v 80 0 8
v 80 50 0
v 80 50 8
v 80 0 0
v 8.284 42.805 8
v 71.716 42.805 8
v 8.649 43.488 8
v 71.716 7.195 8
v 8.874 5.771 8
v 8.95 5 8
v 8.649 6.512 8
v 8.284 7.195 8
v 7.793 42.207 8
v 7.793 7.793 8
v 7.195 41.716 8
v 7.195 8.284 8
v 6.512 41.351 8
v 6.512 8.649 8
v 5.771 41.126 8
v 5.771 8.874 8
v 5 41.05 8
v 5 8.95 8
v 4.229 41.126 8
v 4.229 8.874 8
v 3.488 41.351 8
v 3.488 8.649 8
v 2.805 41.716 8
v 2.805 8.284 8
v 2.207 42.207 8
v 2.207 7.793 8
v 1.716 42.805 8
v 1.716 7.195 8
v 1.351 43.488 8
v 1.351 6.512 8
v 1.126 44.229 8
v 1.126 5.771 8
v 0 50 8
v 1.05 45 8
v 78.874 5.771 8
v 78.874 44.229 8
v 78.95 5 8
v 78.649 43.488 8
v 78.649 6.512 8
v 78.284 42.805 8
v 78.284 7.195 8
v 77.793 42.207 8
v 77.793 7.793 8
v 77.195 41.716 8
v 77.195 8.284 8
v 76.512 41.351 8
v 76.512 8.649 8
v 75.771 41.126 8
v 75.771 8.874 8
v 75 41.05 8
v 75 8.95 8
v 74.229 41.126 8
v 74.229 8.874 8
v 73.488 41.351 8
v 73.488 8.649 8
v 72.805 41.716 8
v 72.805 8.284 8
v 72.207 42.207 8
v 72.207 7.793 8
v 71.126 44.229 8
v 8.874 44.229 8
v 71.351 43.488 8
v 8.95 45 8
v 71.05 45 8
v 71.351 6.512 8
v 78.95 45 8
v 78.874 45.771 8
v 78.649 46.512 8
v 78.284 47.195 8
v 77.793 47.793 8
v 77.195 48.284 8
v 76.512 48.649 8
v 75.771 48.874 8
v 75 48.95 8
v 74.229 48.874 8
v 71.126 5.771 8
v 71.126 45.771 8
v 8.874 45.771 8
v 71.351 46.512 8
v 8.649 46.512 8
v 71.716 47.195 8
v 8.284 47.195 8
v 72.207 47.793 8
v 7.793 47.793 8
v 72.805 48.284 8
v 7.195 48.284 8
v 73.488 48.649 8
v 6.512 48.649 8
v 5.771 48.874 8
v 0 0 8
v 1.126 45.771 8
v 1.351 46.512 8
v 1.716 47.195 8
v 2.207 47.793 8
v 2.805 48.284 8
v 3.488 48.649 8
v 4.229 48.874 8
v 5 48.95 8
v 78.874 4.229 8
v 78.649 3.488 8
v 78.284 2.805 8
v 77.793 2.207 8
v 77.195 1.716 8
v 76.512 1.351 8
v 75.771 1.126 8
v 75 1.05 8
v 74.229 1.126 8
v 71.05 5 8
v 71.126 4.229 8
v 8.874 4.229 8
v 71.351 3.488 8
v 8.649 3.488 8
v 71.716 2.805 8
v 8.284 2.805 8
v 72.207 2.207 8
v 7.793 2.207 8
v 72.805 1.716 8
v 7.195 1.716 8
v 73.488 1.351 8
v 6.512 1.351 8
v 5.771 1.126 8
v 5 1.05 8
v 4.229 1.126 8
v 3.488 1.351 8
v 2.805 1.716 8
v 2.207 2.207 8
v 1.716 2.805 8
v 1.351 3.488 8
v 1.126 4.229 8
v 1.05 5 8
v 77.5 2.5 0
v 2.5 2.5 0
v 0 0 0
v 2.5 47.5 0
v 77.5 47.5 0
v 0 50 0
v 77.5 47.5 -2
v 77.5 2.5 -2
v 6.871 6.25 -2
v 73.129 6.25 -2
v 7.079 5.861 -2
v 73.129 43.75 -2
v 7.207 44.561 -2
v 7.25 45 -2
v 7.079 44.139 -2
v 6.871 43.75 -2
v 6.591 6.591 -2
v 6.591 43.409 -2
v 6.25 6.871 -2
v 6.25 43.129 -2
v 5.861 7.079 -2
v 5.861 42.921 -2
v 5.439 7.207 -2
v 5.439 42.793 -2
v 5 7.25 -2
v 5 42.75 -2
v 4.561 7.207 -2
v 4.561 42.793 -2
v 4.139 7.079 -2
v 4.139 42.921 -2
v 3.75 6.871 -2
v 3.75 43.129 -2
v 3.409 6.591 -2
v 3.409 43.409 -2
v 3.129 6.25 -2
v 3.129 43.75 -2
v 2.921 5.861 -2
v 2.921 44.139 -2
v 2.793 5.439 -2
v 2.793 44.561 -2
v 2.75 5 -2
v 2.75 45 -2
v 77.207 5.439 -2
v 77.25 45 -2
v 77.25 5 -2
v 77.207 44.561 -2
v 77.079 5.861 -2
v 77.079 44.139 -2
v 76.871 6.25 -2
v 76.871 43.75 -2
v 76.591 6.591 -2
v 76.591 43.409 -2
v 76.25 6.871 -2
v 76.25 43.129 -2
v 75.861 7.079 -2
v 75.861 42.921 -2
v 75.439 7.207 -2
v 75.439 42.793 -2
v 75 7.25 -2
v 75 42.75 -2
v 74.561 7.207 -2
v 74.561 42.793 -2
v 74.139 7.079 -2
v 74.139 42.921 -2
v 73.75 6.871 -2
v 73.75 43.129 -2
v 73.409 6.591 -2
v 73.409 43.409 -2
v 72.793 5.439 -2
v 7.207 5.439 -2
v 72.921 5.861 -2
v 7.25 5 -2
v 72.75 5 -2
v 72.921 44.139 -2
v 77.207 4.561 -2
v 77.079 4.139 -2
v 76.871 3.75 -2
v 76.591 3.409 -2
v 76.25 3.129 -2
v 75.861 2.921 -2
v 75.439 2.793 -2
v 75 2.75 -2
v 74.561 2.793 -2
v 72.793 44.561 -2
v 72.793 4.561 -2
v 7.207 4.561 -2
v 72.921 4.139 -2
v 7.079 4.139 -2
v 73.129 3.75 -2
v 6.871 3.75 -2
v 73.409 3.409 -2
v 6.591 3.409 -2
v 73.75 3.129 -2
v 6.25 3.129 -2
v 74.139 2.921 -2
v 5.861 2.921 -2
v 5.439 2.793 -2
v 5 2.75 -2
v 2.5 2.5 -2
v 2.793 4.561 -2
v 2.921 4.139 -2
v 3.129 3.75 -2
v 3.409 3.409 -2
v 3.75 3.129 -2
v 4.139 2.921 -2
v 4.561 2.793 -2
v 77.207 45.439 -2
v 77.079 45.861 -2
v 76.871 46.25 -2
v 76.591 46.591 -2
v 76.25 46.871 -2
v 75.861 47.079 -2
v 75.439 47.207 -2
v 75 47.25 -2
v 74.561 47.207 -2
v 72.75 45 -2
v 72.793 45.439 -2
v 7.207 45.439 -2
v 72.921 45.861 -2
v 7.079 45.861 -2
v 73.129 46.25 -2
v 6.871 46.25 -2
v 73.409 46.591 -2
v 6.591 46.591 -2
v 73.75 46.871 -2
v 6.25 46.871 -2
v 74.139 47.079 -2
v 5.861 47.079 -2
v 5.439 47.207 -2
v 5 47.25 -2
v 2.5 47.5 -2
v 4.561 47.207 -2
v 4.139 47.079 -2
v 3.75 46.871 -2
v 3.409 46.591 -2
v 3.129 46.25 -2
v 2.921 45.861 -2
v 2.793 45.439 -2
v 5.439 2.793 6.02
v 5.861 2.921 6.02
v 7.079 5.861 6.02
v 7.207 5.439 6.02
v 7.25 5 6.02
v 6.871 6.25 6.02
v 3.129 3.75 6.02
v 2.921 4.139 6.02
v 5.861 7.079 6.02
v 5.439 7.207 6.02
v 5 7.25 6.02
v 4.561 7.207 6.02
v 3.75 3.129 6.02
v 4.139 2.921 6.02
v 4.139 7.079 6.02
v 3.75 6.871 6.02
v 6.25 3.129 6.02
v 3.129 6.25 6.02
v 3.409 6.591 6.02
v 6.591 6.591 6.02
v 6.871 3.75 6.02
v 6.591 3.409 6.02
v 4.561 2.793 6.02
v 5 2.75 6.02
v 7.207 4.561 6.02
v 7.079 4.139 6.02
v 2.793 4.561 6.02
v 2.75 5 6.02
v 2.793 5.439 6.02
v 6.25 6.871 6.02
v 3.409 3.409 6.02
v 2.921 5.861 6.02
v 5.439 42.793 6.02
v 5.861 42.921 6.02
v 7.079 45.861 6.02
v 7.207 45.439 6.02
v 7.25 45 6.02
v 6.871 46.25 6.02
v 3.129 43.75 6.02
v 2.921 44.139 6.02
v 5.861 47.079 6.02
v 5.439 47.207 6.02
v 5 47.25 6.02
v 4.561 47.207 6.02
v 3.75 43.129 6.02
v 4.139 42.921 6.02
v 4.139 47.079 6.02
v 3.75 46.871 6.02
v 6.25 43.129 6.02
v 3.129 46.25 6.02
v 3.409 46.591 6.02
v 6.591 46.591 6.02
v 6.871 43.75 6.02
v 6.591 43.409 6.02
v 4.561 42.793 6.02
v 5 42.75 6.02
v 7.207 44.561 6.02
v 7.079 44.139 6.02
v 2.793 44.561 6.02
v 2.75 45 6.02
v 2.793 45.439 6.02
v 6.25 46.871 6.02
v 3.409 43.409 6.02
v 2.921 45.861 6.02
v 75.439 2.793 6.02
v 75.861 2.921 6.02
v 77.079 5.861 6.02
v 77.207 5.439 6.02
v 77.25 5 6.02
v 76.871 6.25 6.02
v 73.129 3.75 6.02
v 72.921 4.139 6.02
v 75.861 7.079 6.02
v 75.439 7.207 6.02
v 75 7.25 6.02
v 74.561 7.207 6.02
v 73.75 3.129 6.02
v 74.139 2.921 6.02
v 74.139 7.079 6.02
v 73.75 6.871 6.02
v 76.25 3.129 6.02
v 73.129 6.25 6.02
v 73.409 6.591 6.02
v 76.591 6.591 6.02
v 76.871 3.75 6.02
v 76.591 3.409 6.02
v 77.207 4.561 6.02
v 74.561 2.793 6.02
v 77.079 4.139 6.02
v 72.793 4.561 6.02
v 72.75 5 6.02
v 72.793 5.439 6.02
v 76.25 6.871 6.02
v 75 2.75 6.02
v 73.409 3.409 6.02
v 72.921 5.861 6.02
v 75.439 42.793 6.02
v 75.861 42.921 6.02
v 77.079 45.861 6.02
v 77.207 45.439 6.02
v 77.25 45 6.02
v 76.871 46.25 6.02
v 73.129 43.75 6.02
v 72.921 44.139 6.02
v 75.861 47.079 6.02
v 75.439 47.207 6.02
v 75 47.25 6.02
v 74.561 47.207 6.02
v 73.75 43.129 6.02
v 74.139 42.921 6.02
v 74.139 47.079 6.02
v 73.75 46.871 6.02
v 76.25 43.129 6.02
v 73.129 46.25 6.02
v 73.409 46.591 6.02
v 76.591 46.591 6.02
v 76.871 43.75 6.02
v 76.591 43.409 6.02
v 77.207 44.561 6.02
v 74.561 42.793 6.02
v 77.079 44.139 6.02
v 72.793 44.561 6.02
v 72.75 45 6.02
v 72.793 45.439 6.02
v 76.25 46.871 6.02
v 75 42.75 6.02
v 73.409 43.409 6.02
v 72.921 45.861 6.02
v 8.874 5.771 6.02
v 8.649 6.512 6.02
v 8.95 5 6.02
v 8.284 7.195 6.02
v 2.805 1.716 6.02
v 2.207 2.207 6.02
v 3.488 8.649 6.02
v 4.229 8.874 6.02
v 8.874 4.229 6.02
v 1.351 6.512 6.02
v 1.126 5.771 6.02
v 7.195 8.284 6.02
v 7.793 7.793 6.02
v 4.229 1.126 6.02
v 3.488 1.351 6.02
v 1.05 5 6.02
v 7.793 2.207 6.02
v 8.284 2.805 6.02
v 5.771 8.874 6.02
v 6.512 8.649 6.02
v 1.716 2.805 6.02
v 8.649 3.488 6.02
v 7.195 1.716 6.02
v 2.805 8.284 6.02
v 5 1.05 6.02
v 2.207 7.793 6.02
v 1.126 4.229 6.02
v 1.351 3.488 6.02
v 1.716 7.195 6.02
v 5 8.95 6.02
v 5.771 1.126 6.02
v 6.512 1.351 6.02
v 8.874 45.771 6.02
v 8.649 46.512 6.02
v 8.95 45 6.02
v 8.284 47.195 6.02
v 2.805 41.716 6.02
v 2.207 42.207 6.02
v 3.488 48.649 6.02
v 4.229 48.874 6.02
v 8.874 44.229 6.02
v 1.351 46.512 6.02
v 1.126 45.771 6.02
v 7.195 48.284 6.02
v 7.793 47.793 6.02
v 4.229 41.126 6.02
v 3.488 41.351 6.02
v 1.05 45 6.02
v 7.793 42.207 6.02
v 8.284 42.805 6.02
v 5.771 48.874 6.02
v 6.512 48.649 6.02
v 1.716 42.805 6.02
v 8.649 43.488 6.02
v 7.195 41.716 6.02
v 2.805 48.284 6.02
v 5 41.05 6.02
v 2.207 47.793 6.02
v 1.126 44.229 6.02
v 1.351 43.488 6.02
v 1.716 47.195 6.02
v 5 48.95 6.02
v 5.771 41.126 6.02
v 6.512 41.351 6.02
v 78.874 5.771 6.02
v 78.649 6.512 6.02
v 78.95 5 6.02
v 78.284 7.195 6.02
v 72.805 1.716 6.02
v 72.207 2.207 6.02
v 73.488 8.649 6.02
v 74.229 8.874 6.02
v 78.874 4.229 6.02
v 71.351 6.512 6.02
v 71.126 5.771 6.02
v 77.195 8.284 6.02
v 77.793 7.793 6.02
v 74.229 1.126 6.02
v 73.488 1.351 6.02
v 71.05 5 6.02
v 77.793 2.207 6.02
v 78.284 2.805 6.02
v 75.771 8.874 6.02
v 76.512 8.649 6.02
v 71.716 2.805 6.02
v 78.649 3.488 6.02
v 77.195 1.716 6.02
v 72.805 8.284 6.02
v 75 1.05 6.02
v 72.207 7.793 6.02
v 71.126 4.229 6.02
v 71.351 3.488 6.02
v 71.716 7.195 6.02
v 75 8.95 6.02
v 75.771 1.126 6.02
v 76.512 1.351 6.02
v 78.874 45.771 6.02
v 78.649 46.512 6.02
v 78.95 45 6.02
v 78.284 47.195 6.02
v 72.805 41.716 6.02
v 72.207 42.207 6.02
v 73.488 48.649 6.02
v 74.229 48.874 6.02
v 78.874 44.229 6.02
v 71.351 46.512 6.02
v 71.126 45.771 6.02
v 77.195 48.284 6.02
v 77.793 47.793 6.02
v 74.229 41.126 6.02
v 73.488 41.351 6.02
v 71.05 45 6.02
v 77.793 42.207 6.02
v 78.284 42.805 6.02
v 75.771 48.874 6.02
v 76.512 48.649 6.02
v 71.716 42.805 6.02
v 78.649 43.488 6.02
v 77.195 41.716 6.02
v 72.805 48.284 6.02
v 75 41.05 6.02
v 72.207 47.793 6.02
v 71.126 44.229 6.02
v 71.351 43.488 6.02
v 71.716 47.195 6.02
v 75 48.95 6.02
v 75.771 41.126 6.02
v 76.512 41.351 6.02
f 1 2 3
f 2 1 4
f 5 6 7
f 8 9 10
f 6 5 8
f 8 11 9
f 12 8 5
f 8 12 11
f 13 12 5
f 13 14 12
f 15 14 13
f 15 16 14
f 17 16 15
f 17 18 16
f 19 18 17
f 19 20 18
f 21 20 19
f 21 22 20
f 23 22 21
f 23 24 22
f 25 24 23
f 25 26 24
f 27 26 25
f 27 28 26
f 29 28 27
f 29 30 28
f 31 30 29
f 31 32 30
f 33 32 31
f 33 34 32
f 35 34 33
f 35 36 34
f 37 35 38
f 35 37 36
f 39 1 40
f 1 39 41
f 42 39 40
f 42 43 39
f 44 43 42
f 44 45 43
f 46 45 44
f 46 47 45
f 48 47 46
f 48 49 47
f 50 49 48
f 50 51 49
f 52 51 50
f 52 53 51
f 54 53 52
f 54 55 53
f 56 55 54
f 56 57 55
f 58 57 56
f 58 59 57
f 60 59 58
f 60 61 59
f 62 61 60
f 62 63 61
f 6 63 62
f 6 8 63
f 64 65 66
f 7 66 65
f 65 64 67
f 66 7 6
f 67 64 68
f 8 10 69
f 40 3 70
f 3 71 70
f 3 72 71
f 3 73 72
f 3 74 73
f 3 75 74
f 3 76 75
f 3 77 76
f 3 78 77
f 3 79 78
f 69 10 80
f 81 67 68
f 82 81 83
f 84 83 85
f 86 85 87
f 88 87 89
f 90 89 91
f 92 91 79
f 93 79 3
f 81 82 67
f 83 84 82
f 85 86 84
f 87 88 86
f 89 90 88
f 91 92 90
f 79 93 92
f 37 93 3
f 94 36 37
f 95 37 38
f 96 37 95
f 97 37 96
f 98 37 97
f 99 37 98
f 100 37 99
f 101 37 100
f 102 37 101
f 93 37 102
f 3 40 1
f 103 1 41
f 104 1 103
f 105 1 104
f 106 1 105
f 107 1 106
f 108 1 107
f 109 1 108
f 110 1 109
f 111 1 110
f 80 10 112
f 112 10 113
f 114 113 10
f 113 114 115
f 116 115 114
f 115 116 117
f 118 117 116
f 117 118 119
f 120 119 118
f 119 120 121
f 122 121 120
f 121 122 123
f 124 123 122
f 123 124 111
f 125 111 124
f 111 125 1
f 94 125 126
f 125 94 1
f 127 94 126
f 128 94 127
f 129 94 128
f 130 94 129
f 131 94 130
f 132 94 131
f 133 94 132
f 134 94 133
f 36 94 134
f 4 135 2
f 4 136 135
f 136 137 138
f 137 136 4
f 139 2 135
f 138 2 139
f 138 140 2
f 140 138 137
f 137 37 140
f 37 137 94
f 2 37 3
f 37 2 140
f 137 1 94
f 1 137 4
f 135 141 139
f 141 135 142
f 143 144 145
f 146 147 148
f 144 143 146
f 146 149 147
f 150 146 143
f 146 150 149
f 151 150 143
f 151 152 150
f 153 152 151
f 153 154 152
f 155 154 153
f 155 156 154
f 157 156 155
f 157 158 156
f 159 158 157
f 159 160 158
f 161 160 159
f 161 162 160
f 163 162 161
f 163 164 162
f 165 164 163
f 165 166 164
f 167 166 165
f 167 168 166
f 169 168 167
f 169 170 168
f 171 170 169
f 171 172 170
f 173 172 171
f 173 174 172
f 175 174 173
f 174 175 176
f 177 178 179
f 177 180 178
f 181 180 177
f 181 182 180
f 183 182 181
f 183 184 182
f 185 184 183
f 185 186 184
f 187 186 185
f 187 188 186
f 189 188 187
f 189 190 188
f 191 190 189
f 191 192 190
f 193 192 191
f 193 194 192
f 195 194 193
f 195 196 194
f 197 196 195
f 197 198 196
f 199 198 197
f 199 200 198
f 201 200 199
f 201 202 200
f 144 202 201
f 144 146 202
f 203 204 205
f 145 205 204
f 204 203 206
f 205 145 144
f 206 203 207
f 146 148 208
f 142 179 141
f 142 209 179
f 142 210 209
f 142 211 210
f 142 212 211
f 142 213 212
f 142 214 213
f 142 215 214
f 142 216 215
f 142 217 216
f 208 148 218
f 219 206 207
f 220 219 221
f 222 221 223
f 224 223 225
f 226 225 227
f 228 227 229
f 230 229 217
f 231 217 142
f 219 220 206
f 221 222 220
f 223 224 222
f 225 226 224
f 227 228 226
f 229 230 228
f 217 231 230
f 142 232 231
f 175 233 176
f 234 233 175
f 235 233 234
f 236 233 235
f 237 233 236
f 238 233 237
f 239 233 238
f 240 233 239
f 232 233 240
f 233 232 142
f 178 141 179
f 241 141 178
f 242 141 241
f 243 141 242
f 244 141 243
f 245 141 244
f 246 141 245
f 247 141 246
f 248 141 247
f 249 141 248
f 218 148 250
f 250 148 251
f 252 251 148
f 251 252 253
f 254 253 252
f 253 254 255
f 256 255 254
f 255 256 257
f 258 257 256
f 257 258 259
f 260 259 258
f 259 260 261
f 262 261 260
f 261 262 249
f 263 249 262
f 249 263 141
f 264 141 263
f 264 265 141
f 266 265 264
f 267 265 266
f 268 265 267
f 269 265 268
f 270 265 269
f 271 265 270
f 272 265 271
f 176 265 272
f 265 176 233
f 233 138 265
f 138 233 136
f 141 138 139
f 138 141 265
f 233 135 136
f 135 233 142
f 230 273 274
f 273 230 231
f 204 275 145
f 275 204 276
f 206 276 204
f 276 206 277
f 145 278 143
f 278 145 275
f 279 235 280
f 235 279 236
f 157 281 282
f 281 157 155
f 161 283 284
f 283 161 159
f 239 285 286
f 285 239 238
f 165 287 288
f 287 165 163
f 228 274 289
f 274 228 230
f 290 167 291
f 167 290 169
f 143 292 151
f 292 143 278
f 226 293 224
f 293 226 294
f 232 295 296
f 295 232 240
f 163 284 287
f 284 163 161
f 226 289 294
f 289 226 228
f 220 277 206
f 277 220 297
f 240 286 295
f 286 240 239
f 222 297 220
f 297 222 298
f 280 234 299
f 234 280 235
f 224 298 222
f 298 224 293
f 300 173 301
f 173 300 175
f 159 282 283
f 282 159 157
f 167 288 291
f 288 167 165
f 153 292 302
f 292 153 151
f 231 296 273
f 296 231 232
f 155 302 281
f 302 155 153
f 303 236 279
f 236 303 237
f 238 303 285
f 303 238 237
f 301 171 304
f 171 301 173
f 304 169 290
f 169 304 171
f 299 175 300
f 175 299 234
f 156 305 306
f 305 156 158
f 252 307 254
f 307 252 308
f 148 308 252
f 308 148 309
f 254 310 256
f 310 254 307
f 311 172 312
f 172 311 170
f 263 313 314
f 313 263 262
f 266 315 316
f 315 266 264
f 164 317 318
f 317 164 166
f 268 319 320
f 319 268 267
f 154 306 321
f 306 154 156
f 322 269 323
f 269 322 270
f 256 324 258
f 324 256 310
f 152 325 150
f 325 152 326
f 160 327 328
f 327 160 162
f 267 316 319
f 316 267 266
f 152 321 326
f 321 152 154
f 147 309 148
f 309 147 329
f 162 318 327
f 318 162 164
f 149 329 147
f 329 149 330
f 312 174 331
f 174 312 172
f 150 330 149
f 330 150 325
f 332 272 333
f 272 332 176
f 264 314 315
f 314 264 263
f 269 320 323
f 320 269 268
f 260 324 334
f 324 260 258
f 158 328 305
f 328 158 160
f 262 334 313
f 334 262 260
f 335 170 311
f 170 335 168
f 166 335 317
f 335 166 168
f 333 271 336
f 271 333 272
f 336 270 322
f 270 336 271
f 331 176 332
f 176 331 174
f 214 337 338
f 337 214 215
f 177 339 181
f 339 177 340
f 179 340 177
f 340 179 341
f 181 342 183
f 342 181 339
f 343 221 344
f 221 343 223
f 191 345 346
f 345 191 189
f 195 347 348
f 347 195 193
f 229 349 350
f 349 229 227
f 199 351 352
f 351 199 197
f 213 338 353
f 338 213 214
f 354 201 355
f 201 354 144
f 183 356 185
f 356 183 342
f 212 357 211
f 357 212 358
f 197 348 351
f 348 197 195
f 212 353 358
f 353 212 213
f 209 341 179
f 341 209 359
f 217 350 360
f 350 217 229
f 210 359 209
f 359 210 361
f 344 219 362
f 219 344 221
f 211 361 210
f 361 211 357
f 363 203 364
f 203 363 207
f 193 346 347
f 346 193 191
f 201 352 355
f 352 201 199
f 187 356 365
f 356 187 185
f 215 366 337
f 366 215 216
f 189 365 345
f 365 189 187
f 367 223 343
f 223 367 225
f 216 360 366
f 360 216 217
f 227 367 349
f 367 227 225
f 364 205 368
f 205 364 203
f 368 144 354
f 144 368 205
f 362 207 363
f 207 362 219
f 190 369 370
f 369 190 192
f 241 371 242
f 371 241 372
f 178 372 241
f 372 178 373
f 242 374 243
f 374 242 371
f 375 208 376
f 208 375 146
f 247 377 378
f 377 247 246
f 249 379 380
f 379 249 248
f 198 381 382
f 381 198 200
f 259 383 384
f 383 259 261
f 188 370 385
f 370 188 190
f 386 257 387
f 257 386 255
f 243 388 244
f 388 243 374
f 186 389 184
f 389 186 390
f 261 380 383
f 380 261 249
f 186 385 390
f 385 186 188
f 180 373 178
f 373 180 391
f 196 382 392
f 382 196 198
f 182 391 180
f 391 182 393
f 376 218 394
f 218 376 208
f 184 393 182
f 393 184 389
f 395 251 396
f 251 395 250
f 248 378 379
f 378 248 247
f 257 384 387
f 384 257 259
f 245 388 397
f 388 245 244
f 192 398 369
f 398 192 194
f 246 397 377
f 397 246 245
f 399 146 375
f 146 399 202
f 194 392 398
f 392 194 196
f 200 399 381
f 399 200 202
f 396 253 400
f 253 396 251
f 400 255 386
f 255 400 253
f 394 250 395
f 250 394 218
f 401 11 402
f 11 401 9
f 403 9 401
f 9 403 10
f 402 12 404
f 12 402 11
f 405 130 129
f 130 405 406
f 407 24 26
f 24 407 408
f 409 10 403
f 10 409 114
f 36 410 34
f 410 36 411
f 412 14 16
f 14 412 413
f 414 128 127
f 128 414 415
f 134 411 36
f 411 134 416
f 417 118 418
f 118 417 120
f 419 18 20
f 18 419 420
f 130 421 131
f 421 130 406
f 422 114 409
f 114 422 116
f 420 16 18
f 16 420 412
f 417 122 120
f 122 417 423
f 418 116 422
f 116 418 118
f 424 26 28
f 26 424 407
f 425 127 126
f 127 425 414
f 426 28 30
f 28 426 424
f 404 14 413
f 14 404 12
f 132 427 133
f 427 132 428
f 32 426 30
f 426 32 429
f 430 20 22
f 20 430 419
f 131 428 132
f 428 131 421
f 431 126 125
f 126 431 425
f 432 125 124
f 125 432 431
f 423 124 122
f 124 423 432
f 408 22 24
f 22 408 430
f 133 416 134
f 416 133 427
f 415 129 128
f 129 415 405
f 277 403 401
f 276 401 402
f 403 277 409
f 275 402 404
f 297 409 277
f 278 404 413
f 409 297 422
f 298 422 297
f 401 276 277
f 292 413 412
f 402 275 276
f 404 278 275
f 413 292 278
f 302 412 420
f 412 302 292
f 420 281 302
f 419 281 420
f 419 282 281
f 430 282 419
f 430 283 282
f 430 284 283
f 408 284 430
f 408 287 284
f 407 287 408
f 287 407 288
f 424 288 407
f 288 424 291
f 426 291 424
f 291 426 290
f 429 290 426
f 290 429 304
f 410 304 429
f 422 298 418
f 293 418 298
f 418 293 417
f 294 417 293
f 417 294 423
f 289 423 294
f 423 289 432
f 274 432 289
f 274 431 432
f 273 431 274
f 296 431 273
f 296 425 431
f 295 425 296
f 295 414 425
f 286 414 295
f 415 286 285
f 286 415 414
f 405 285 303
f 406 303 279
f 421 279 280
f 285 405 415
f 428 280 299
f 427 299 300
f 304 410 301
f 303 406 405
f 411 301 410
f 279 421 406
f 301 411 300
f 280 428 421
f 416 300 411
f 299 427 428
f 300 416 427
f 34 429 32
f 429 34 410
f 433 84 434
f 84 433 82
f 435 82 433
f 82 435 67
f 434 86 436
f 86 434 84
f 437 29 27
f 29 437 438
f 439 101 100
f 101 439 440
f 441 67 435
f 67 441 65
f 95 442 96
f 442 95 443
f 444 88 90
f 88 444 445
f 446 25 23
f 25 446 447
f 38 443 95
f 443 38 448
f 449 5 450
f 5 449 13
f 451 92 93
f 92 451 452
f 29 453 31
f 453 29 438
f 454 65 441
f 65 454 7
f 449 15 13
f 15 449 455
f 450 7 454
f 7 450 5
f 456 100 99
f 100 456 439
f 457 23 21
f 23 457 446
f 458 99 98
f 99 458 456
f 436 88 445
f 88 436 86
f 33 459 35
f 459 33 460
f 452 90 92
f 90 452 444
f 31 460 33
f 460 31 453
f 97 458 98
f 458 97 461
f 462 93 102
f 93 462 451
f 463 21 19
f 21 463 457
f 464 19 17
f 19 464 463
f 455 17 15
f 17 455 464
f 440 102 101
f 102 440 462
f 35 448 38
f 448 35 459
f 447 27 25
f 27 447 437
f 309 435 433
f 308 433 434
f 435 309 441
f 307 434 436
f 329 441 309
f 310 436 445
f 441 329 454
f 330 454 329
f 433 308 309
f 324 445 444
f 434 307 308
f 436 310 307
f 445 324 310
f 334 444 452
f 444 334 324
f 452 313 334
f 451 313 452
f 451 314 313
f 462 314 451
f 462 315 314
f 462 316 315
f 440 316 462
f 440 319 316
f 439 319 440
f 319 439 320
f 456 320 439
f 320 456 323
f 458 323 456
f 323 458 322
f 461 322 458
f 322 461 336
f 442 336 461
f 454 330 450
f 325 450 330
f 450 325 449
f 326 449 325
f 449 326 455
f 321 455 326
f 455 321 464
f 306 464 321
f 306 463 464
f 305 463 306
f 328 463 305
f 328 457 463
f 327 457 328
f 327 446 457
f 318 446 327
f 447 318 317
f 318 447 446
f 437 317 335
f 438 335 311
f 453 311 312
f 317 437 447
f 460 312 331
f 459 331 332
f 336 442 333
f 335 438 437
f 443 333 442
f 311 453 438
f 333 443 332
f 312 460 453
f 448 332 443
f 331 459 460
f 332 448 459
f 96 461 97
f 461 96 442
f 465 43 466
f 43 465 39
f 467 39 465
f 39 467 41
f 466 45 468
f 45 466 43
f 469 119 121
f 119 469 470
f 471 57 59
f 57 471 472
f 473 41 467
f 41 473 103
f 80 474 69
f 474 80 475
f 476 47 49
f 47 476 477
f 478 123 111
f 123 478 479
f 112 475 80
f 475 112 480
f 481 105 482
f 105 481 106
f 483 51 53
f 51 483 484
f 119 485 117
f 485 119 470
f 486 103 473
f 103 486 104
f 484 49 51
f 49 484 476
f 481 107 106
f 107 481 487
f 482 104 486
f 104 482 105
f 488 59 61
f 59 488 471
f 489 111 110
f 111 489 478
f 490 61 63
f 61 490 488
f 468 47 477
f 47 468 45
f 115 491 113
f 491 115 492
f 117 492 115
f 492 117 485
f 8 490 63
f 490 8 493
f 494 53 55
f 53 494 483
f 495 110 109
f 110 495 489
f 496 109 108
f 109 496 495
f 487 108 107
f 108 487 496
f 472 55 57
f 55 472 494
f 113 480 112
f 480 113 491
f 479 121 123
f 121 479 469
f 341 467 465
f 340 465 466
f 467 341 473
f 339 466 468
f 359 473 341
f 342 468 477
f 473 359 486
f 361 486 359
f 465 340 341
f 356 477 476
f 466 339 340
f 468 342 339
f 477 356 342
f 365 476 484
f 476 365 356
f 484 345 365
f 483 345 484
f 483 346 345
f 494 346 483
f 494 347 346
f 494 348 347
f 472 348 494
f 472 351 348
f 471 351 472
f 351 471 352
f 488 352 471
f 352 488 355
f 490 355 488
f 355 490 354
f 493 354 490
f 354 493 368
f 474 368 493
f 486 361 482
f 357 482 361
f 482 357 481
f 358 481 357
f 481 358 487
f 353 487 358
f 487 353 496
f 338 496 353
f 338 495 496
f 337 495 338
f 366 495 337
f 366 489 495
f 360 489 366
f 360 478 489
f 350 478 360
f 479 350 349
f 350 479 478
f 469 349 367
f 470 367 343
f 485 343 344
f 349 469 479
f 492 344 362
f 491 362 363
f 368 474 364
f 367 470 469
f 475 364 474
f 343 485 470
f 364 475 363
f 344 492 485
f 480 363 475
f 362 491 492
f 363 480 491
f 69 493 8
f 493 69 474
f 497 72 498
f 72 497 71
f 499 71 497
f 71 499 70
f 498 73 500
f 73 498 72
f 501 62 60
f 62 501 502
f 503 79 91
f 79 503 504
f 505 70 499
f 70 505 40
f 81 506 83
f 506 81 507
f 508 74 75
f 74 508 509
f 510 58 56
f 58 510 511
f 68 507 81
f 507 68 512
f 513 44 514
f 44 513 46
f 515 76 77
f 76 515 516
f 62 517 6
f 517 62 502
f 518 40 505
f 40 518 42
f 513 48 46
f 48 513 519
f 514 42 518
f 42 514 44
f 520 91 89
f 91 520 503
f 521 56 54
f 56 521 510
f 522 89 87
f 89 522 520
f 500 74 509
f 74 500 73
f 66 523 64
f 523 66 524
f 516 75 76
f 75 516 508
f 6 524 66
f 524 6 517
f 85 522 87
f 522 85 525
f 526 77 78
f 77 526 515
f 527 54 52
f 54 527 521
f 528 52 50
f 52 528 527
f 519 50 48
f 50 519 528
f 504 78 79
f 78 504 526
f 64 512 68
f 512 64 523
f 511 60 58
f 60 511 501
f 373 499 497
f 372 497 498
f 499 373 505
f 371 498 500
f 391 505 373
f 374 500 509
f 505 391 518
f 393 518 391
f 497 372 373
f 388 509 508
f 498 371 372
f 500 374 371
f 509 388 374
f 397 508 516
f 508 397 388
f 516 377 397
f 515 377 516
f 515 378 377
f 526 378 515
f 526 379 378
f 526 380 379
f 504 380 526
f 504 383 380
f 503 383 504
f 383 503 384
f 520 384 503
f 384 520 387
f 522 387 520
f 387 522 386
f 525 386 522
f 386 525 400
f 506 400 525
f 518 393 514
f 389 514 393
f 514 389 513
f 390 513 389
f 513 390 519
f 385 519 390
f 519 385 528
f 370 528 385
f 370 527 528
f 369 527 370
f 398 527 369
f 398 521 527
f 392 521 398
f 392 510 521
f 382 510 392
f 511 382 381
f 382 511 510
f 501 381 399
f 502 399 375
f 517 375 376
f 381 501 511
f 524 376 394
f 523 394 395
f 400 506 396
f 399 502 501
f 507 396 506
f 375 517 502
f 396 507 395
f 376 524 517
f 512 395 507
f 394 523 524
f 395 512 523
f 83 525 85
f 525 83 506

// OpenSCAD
$fn = 32;

// ----------------------------------------------------------------------
// Enclosure lid: 80 x 50 x 8 mm, 4 bolt holes
// ----------------------------------------------------------------------

// --- parameters (mm) ---
length = 80;              // lid length, X
width = 50;               // lid width, Y
plate_t = 8;              // lid plate thickness
bolt_d = 4.5;             // bolt clearance
boss_lip = 5;             // bolt hole inset from the corner
sink = 1;                 // overlap of the lip and ribs into the plate
lip_h = 3;                // lip height below the plate
lip_wall = 2.5;           // lip wall thickness
cs_d = 7.9;               // countersink diameter
cs_h = 1.98;              // countersink depth

module plate() {
  cube([length, width, plate_t]);
  /* lip that drops into the housing opening, sunk into the plate */
  translate([lip_wall, lip_wall, -lip_h + sink]) cube([length - 2 * lip_wall, width - 2 * lip_wall, lip_h]);
}

difference() {
  plate();
  /* bolt pattern matching the corner bosses */
  for (sx = [0, 1]) for (sy = [0, 1])
    translate([sx * (length - 2 * boss_lip) + boss_lip, sy * (width - 2 * boss_lip) + boss_lip, -lip_h - 1])
      cylinder(h = plate_t + lip_h + 2, d = bolt_d);
  /* countersinks so the heads sit flush */
  for (sx = [0, 1]) for (sy = [0, 1])
    translate([sx * (length - 2 * boss_lip) + boss_lip, sy * (width - 2 * boss_lip) + boss_lip, plate_t - cs_h])
      cylinder(h = cs_h + 0.5, d = cs_d);
}
